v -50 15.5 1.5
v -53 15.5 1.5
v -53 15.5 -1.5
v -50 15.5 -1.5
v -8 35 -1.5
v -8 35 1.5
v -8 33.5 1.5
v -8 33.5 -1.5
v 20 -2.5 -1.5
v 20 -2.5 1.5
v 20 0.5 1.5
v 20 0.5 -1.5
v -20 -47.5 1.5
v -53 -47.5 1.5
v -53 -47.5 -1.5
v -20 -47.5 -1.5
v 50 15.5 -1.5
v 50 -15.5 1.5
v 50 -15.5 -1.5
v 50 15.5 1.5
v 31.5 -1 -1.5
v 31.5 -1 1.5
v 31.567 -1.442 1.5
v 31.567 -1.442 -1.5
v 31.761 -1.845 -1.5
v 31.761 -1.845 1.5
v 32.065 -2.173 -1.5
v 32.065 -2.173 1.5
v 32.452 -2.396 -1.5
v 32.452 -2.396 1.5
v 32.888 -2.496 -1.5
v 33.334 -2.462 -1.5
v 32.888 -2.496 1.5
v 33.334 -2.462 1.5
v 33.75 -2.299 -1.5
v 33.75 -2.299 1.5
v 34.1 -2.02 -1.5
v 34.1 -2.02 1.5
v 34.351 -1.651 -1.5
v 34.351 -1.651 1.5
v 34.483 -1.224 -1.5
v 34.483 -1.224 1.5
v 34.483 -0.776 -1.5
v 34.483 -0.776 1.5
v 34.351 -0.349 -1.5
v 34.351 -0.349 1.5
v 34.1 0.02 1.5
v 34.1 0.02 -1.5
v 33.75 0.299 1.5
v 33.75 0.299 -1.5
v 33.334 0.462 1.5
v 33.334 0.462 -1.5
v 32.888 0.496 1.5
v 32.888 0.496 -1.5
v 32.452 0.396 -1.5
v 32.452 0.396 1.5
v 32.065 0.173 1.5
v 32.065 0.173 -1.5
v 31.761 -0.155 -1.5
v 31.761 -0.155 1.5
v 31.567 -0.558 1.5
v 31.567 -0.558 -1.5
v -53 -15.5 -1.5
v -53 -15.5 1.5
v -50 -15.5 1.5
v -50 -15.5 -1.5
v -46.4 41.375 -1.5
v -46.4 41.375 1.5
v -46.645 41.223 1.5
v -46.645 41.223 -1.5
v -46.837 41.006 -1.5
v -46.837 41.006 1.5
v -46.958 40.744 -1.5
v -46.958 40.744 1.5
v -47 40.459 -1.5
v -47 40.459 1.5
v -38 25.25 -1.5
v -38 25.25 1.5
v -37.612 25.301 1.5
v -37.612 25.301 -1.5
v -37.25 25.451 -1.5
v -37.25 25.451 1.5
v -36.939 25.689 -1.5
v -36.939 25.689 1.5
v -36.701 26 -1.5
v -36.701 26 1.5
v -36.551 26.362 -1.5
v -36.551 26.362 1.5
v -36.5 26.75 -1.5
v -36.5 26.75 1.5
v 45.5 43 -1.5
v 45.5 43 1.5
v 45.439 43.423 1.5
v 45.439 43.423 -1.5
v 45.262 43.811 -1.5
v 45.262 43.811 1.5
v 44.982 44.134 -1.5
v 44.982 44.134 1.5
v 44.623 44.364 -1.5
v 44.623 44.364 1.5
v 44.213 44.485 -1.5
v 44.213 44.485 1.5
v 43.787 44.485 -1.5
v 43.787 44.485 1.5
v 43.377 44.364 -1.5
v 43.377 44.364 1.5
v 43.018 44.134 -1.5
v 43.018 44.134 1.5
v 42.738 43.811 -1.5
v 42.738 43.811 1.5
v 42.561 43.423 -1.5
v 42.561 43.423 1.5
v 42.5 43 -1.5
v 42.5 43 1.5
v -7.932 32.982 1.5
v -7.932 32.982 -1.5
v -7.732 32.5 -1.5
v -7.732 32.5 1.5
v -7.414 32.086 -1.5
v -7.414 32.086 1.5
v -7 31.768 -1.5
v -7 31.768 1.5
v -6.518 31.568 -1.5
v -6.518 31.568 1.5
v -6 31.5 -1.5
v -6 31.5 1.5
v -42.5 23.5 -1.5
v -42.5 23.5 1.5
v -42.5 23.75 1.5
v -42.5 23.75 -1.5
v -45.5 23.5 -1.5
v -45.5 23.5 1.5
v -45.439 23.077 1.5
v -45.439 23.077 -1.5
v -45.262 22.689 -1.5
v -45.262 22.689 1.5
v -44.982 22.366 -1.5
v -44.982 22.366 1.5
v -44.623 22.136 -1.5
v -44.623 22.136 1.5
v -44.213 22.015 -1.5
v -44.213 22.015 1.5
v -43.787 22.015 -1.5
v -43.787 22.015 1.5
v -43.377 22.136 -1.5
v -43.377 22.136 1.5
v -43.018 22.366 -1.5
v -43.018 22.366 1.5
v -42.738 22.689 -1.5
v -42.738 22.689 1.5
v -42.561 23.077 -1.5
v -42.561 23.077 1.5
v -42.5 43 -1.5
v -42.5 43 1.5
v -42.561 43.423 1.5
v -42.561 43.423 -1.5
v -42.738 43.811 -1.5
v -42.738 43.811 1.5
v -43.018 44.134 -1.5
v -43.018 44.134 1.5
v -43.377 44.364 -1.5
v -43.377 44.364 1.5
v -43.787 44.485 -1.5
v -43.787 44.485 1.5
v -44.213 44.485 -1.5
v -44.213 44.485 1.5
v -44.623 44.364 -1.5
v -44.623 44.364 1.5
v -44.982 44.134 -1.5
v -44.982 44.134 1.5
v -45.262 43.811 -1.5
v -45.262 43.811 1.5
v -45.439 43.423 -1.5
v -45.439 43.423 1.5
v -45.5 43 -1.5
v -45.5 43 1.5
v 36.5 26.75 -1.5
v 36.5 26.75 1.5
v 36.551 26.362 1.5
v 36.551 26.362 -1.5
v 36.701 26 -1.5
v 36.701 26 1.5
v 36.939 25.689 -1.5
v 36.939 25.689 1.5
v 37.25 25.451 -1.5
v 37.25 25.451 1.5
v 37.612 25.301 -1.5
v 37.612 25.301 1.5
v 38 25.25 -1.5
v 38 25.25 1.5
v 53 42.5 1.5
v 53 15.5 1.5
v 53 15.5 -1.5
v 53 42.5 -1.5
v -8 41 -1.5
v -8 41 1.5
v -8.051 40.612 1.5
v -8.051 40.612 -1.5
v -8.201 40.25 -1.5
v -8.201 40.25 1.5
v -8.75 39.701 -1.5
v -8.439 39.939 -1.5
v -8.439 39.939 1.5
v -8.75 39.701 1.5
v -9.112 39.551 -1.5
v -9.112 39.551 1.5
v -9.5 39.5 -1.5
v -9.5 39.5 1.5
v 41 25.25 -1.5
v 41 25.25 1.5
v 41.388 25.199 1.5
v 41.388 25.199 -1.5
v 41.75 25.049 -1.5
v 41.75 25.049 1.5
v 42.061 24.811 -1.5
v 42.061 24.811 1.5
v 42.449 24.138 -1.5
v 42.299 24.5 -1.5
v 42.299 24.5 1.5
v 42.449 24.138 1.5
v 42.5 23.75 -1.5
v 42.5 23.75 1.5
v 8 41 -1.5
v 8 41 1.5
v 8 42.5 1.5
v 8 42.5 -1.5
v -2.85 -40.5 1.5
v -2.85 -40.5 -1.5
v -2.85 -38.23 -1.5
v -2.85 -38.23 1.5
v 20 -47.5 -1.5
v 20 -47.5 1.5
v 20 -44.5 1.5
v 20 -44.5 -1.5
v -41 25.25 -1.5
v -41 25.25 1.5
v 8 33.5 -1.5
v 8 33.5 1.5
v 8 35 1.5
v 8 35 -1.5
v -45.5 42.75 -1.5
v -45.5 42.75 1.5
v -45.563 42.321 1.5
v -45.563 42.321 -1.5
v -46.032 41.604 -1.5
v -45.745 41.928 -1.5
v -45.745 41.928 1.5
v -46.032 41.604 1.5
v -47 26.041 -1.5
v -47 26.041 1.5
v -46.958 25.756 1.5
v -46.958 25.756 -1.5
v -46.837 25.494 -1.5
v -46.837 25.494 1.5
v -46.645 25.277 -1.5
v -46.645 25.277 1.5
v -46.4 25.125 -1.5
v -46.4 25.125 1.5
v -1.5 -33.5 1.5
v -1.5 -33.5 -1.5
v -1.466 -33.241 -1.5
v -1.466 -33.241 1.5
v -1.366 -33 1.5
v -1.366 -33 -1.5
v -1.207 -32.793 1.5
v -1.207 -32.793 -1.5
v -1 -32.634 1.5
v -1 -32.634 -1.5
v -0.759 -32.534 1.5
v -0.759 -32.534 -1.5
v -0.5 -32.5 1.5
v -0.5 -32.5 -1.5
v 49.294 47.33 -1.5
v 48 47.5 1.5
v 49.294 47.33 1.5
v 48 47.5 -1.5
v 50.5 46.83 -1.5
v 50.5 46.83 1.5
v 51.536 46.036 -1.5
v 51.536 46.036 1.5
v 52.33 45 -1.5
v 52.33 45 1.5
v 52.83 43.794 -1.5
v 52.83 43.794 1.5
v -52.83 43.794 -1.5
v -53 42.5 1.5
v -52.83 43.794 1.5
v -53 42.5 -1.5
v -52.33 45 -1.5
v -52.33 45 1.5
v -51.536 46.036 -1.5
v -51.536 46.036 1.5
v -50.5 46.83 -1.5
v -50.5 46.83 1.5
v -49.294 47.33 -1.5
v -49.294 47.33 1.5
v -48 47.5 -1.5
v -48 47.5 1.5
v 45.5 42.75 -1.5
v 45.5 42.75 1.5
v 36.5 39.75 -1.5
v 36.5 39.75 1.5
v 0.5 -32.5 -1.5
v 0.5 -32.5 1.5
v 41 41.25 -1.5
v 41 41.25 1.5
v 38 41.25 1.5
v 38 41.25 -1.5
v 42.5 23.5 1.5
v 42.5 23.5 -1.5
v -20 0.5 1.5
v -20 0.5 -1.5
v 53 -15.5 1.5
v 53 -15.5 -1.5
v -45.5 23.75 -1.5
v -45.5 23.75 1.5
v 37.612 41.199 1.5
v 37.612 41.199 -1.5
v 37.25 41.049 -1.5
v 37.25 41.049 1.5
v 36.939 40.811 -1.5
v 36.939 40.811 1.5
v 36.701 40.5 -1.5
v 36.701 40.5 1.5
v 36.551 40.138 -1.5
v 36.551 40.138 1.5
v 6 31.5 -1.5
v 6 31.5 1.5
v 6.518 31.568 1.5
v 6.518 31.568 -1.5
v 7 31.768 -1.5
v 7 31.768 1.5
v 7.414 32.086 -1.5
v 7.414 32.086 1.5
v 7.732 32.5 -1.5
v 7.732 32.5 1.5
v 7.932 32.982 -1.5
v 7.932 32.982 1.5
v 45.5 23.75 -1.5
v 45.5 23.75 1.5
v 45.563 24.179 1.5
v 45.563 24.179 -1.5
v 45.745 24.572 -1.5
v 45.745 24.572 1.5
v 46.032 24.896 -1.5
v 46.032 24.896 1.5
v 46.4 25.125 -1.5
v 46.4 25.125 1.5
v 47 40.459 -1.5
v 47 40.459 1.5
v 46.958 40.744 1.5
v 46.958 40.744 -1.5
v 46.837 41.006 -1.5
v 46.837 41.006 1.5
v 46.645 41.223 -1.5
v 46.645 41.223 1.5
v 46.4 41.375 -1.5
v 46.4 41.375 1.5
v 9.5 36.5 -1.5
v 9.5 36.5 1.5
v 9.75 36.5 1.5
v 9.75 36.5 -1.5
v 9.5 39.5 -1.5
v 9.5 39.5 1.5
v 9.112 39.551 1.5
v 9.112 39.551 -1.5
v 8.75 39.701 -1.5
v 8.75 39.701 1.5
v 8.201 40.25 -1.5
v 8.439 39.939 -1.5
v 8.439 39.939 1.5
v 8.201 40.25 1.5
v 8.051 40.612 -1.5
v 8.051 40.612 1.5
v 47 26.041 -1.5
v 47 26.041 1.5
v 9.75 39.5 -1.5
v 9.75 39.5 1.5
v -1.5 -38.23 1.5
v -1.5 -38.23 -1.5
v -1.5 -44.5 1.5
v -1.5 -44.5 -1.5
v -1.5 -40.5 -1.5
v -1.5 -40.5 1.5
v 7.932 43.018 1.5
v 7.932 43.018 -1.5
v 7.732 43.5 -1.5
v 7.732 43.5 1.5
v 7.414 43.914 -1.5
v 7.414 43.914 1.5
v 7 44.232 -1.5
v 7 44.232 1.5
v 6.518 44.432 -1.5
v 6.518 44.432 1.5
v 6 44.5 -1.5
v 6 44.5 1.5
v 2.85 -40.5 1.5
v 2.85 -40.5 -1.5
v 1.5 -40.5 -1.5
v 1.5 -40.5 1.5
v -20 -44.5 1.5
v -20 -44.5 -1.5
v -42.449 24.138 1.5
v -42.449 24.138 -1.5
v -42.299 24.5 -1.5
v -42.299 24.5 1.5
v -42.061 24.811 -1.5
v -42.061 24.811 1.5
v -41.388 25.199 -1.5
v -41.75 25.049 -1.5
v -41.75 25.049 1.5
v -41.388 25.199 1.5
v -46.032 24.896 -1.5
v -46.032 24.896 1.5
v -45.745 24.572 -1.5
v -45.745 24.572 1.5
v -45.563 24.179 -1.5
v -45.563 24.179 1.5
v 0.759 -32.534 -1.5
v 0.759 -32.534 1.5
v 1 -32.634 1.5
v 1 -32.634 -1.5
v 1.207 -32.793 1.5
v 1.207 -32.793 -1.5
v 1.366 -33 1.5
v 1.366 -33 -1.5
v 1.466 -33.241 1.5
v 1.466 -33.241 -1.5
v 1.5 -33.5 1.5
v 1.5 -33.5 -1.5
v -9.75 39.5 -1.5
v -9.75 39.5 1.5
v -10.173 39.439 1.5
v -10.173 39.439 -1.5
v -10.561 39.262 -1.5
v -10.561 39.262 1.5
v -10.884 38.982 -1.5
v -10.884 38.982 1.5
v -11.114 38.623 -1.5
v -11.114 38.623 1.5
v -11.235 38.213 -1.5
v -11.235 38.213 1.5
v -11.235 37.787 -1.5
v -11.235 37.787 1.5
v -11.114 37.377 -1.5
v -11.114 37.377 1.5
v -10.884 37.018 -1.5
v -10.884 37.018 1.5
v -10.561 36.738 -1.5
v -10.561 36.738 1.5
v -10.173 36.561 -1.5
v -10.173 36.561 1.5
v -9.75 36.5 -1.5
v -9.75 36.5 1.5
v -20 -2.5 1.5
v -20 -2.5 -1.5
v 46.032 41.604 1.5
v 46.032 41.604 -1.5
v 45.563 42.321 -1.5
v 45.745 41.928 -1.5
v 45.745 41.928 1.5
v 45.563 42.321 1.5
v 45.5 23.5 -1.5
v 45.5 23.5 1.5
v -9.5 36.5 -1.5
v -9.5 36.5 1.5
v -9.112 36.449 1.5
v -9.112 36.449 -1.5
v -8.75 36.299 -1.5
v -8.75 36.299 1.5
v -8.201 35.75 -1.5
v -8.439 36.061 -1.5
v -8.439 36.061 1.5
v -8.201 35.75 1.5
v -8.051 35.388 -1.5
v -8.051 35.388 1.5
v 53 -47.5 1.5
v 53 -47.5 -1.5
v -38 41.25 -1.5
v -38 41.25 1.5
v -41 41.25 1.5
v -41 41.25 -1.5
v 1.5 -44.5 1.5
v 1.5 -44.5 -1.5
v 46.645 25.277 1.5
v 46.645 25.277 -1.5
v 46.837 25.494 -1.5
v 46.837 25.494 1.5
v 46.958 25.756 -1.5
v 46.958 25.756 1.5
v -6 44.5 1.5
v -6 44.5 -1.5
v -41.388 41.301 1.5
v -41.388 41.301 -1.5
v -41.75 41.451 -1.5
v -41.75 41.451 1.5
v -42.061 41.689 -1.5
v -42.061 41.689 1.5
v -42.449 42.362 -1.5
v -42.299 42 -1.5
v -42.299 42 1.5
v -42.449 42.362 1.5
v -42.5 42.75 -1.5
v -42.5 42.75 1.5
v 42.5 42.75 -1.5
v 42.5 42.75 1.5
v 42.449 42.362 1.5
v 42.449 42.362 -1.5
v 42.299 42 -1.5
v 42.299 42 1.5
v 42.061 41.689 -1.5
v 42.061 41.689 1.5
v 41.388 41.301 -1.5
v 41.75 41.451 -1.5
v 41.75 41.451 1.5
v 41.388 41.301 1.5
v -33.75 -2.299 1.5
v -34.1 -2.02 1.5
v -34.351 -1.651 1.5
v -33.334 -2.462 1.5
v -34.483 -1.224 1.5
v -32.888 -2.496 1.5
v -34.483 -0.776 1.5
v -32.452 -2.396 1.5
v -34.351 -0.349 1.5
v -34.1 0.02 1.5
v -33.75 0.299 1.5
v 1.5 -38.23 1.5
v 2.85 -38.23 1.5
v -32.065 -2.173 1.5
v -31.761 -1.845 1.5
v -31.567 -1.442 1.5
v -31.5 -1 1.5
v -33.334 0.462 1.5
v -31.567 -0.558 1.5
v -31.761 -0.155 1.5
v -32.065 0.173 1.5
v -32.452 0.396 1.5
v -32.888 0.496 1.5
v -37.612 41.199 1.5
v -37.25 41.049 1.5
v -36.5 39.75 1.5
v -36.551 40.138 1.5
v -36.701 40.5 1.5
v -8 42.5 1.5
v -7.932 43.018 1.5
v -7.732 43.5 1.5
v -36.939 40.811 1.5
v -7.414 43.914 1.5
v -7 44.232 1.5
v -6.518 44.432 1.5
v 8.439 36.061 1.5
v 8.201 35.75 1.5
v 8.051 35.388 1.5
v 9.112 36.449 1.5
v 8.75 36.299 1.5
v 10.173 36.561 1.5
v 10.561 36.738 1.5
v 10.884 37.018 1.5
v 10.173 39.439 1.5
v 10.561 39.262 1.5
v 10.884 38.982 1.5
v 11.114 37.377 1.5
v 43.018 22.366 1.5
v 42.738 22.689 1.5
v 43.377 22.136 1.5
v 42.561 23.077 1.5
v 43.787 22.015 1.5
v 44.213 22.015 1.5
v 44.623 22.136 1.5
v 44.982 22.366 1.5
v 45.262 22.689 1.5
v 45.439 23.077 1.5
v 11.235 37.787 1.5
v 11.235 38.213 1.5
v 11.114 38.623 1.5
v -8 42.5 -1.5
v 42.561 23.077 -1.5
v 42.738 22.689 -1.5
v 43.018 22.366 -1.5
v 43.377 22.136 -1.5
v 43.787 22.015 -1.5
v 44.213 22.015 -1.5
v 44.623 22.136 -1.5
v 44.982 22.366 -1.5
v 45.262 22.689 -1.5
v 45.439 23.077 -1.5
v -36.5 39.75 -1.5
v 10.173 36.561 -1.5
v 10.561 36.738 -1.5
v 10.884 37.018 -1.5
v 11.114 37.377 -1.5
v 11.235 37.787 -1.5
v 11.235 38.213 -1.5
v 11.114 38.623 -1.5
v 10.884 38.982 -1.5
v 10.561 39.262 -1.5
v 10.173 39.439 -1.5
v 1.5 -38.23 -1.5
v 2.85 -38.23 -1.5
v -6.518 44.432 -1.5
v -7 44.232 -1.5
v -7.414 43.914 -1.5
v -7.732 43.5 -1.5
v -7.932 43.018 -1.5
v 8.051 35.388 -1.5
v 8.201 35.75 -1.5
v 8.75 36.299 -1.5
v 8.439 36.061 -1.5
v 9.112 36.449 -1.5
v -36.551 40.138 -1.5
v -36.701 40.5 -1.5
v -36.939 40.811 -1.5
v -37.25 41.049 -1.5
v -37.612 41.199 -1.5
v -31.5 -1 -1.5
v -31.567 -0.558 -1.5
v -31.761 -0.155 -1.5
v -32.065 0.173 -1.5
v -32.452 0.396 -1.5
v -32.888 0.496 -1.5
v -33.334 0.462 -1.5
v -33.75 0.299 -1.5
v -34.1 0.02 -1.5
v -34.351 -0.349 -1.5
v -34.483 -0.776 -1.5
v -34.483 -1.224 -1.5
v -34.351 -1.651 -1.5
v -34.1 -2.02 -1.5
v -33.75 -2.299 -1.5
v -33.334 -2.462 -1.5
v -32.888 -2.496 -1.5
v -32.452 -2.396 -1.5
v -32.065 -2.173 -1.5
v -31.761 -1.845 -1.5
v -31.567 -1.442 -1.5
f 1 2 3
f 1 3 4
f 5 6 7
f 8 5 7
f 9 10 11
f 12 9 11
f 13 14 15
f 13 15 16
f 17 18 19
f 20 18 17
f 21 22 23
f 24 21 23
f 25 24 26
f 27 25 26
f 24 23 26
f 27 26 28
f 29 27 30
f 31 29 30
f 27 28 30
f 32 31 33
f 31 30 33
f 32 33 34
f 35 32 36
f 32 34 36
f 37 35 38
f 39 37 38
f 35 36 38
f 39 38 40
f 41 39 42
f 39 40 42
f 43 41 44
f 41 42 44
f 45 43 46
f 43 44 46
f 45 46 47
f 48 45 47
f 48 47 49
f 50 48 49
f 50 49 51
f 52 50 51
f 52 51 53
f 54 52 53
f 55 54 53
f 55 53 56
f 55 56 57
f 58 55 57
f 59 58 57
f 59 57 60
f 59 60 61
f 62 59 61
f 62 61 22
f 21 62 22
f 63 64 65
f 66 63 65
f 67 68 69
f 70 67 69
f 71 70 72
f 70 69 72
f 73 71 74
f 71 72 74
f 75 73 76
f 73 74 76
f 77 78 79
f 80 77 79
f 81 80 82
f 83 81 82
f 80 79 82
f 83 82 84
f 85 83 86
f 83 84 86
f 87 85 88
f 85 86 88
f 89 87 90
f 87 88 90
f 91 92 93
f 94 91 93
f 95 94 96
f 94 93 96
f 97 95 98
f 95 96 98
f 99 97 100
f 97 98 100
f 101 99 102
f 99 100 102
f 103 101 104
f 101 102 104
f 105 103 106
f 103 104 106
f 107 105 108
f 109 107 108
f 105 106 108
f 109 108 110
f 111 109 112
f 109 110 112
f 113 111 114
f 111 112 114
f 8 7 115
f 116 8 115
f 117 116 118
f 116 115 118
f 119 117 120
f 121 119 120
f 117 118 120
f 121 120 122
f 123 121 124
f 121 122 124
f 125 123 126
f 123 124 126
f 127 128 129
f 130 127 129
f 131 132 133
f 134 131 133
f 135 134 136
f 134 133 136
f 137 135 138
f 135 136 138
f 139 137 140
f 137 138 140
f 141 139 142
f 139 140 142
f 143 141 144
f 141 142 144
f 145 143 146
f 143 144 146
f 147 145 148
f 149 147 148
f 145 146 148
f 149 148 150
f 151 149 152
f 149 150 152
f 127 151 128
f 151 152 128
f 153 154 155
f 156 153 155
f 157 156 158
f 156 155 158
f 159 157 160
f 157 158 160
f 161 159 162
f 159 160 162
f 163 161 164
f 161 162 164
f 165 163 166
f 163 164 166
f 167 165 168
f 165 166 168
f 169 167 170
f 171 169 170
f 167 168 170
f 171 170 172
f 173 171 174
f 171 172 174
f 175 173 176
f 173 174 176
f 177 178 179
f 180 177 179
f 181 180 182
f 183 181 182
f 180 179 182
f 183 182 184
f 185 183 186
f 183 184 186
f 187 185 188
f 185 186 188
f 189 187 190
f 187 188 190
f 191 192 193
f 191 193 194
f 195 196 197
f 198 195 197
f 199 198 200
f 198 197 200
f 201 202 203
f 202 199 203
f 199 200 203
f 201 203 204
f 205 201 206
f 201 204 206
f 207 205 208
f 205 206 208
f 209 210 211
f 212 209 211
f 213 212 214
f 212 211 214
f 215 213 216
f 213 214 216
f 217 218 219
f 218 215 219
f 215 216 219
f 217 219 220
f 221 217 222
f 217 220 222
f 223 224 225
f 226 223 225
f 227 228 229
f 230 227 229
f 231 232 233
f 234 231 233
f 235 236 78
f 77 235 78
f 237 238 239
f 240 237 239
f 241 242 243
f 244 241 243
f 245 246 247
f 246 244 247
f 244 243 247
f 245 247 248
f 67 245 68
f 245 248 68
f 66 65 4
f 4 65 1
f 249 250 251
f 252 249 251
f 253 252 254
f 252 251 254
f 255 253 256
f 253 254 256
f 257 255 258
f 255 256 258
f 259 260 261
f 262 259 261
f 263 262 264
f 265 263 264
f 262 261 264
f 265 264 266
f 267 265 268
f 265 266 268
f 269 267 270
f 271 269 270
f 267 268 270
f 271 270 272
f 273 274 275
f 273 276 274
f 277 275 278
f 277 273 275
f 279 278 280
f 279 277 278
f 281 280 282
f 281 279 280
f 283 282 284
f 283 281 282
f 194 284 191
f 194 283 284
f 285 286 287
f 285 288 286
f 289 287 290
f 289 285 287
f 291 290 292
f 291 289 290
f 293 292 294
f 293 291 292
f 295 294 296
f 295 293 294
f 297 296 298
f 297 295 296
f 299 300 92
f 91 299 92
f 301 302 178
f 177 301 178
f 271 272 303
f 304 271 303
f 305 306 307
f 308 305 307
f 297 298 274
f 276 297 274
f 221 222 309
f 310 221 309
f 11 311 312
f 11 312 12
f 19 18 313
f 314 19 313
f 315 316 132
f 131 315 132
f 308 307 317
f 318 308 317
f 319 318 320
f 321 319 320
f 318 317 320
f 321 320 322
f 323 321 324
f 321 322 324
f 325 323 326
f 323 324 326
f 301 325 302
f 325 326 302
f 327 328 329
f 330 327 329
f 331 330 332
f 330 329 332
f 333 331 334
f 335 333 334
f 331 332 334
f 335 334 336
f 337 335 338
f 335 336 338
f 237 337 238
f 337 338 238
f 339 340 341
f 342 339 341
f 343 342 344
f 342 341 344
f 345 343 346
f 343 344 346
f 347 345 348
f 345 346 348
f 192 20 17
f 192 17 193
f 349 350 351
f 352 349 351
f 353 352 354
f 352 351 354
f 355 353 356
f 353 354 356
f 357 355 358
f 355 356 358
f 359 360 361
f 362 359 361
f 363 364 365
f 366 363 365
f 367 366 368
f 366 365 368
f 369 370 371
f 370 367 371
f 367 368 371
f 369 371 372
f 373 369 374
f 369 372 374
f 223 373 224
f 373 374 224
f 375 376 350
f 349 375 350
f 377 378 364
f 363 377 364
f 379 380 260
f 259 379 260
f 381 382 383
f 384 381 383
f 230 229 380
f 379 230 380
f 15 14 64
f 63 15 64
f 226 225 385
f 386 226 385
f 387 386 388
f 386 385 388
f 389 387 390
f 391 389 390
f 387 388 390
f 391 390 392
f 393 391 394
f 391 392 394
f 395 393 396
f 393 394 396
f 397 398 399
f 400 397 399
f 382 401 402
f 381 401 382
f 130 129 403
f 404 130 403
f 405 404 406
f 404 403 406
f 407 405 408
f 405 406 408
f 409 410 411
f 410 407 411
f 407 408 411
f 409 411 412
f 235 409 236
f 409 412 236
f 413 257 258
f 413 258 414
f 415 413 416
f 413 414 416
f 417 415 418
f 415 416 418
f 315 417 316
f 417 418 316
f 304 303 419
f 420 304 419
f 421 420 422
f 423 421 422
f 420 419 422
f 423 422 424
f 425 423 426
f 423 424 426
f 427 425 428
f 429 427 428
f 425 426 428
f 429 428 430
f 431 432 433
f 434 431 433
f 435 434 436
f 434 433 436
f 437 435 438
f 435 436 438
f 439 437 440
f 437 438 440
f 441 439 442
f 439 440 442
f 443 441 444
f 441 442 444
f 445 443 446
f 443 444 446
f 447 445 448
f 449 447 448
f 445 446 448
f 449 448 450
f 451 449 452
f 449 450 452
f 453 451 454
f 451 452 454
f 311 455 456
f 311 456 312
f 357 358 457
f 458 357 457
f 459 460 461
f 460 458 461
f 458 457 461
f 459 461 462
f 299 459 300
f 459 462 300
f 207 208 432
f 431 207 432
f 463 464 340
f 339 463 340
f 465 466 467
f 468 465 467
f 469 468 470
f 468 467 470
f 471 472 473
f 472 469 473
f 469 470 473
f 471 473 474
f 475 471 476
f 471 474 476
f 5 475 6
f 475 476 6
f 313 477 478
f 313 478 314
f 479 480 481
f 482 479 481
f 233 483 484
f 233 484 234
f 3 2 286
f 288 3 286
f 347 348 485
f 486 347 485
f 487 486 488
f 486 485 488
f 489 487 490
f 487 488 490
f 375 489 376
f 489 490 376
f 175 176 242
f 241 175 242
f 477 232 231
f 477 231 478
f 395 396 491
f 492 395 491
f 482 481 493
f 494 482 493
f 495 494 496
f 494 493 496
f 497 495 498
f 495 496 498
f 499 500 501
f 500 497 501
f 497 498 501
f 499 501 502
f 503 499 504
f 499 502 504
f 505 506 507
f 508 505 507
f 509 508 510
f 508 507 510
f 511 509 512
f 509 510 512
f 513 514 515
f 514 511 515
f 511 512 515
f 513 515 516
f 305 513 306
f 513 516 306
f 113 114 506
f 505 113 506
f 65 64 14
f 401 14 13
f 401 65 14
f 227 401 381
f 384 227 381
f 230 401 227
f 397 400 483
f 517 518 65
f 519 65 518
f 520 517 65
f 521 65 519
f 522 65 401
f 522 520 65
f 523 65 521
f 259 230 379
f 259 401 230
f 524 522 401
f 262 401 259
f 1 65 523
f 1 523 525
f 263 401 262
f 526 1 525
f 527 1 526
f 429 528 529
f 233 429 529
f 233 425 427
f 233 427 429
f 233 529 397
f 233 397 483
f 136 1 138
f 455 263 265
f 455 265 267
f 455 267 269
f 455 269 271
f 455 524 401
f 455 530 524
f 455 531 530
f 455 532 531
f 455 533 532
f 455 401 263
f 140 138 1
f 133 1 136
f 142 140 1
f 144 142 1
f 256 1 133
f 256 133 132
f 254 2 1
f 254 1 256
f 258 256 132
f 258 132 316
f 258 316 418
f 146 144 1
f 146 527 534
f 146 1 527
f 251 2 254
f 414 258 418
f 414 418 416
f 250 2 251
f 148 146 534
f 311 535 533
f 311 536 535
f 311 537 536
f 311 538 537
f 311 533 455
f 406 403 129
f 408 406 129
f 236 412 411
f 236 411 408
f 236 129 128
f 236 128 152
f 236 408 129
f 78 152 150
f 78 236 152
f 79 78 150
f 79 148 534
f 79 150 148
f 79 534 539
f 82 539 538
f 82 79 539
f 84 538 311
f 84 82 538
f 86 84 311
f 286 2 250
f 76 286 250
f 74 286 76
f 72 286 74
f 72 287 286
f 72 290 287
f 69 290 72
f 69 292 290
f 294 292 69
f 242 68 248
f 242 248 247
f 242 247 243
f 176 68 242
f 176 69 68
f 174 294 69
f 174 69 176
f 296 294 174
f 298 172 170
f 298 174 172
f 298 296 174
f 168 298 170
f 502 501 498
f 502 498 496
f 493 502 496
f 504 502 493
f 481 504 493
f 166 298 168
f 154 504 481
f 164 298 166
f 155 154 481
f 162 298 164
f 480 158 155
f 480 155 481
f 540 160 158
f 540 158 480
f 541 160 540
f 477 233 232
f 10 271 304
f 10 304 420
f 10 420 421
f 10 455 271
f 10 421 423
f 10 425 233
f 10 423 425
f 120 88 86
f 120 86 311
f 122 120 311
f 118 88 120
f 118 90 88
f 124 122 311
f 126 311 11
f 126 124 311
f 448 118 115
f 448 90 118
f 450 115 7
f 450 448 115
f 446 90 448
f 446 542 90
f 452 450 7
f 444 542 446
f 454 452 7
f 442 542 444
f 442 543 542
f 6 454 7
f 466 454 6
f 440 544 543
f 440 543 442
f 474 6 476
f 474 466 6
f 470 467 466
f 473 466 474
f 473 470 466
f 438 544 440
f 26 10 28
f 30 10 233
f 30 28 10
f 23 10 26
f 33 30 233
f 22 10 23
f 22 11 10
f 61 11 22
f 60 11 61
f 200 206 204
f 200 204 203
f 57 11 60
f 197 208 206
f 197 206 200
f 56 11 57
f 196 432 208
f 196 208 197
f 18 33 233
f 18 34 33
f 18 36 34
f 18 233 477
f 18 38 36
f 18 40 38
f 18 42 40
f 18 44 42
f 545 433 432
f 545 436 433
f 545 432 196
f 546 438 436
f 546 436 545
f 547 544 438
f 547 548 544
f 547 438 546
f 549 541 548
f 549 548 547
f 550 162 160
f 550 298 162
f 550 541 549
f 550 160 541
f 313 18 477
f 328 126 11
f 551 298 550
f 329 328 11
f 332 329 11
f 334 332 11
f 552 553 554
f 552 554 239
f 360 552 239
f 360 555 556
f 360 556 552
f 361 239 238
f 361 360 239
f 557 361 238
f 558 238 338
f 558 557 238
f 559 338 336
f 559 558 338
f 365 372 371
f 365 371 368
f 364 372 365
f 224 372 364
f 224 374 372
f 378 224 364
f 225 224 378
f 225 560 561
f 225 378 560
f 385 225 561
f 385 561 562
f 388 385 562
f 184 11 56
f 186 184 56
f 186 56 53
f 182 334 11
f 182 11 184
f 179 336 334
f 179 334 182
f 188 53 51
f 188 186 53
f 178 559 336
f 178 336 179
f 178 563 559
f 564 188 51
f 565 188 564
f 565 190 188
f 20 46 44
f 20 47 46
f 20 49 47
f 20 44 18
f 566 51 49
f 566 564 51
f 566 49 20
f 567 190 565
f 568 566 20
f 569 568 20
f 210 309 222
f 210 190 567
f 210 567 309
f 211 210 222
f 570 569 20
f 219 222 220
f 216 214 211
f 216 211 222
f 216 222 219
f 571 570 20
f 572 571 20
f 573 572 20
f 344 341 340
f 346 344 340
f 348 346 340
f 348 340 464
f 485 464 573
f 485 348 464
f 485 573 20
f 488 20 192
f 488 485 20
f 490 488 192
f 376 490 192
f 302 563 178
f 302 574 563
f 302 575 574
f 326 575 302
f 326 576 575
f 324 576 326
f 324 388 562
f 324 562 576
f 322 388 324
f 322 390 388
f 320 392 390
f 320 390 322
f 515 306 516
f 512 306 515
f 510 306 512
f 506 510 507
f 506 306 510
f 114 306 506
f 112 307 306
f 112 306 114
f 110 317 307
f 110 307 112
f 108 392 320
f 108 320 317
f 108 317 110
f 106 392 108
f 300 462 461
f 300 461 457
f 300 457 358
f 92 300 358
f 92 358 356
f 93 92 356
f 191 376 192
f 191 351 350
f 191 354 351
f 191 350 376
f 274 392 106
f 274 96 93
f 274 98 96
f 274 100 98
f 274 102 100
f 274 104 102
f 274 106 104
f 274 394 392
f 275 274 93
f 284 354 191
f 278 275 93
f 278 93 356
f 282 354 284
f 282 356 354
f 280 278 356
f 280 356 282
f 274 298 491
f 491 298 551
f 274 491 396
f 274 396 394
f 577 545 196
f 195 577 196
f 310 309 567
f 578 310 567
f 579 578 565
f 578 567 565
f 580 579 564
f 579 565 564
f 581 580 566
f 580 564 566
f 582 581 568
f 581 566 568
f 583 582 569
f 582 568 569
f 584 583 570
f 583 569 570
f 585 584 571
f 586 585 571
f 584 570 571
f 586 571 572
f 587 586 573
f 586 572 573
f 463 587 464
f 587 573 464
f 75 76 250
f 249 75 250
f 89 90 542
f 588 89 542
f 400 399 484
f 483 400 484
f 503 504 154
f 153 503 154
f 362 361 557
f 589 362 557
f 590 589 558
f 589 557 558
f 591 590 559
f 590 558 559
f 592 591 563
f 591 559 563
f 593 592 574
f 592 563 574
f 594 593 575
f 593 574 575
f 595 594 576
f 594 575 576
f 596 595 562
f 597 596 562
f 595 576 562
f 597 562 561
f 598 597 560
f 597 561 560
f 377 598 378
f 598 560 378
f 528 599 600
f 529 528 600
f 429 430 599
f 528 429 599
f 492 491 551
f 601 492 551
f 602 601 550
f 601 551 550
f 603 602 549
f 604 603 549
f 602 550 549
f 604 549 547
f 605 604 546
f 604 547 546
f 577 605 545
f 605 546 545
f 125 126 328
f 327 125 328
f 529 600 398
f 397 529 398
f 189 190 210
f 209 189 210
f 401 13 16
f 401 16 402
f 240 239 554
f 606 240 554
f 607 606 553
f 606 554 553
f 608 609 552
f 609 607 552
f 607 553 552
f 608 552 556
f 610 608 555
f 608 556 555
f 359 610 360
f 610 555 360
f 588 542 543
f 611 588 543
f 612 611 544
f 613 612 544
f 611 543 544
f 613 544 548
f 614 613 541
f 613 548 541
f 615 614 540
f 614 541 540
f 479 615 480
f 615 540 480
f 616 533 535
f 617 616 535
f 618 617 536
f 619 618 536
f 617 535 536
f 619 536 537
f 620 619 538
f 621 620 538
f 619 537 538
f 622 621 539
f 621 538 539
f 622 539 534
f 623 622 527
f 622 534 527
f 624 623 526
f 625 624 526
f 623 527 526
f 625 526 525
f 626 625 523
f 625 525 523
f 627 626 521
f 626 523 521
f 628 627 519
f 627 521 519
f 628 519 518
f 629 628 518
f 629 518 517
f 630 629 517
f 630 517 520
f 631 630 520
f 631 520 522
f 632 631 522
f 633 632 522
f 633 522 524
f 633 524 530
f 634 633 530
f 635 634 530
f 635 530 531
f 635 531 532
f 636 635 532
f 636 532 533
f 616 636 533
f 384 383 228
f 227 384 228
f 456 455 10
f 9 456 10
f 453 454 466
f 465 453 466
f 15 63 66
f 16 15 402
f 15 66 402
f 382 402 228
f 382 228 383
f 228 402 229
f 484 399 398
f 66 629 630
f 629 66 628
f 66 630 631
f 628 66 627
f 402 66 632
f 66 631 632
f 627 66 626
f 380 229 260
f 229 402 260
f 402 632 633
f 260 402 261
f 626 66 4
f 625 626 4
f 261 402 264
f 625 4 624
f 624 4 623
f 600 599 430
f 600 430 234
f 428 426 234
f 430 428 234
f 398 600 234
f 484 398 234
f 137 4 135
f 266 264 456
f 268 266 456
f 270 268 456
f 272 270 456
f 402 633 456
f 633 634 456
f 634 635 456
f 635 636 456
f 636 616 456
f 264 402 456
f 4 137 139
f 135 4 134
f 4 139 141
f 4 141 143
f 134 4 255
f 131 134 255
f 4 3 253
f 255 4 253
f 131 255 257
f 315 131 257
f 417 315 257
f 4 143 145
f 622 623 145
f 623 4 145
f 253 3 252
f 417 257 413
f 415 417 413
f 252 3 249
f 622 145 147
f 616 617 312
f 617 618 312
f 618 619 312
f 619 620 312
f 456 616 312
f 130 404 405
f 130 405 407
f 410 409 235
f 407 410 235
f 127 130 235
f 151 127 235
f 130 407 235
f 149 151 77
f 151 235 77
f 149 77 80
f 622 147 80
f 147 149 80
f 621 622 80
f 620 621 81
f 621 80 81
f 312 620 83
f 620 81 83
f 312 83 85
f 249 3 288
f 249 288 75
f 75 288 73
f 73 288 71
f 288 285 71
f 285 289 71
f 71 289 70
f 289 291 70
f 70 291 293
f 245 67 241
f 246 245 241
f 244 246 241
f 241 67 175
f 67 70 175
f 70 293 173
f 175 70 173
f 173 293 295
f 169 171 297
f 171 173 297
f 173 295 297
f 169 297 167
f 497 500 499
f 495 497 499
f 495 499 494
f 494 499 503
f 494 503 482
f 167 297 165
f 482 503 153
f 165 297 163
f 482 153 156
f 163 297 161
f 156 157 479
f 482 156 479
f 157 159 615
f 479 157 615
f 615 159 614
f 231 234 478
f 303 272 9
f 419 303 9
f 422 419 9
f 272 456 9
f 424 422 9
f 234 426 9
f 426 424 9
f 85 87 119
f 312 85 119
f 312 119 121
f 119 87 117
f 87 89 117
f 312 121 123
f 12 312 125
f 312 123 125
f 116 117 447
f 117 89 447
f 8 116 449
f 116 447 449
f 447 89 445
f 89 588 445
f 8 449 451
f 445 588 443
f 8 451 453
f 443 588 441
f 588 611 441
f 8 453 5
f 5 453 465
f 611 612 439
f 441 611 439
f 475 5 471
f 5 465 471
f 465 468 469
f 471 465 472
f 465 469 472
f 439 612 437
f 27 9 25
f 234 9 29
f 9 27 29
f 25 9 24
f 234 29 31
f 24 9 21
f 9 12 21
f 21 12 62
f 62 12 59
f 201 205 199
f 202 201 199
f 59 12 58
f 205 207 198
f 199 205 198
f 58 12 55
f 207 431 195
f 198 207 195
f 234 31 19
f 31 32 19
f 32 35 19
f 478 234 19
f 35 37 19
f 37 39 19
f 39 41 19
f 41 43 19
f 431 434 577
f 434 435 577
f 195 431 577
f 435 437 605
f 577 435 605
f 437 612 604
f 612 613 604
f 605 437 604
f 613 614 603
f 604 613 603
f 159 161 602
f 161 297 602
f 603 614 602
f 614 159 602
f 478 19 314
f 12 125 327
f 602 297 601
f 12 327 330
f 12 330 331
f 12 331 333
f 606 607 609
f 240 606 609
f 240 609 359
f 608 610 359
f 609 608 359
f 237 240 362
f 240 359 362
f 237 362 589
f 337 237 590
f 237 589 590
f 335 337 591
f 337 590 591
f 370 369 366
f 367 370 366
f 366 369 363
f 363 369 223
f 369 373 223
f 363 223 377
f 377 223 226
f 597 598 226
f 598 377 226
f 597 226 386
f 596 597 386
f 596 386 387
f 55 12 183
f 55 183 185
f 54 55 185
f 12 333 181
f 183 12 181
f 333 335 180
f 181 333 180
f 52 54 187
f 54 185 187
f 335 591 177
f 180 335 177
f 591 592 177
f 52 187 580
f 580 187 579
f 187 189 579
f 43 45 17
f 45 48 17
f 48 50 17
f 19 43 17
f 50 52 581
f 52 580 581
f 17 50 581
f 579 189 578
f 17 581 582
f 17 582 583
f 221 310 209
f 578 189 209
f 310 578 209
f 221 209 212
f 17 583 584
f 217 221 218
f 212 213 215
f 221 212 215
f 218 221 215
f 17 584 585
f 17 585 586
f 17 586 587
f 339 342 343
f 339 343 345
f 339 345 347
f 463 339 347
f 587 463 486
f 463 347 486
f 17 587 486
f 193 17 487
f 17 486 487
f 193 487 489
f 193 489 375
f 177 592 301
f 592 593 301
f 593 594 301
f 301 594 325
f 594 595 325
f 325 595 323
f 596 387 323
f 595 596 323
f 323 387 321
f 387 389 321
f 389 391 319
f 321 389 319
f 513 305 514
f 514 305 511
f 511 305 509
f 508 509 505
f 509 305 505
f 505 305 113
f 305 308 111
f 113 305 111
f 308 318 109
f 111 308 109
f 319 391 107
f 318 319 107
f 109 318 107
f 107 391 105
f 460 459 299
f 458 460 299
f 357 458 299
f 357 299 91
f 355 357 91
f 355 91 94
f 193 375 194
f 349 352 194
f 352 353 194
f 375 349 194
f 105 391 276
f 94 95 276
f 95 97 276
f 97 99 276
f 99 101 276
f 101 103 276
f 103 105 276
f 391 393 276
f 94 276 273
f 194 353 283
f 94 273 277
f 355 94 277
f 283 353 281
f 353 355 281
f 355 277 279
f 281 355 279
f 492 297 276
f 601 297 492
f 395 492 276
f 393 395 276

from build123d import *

# Parameters (mm, degrees)
ESBO_O1_W                = 100
ESBO_O1_H                = 95
RESSALTO_EXTRUS_O1_DEPTH = 1.5
ESBO_O2_R                = 1.5
ESBO_O2_W                = 40
ESBO_O2_H                = 3
CORTE_EXTRUS_O1_DEPTH    = 70.030790232
ESBO_O3_W                = 3
ESBO_O3_H                = 32
RESSALTO_EXTRUS_O2_DEPTH = 3
CUT_EXTRUDE1_DEPTH       = 72.233770081
CUT_EXTRUDE1_DEPTH_BACK  = 72.233770081
CUT_EXTRUDE4_DEPTH       = 72.186375101
CUT_EXTRUDE4_DEPTH_BACK  = 72.186375101
FILLET1_R                = 5


with BuildPart() as part:
    # Esboço1 → Ressalto-extrusão1 (new, symmetric)
    with BuildSketch(Plane.XY):
        Rectangle(ESBO_O1_W, ESBO_O1_H)
    extrude(amount=RESSALTO_EXTRUS_O1_DEPTH, both=True)

    # Esboço2 → Corte-extrusão1 (cut, through all)
    with BuildSketch(Plane.XY.offset(1.5)):
        with Locations((-33, -1)):
            Circle(ESBO_O2_R)
        with Locations(Location((33, -1, 0), (0, 0, 180))):
            Circle(ESBO_O2_R)
        with Locations((0, -46)):
            Rectangle(ESBO_O2_W, ESBO_O2_H)
        with Locations((0, -1)):
            Rectangle(ESBO_O2_W, ESBO_O2_H)
    extrude(amount=-CORTE_EXTRUS_O1_DEPTH, mode=Mode.SUBTRACT)

    # Esboço3 → Ressalto-extrusão2 (add, through all)
    with BuildSketch(Plane.XY.offset(1.5)):
        with Locations((-51.5, -31.5)):
            Rectangle(ESBO_O3_W, ESBO_O3_H)
        with Locations((51.5, -31.5)):
            Rectangle(ESBO_O3_W, ESBO_O3_H)
        with Locations((-51.5, 31.5)):
            Rectangle(ESBO_O3_W, ESBO_O3_H)
        with Locations((51.5, 31.5)):
            Rectangle(ESBO_O3_W, ESBO_O3_H)
    extrude(amount=-RESSALTO_EXTRUS_O2_DEPTH)

    # Sketch1 → Cut-Extrude1 (cut, two sides: drawn at the far end of the back side and taken through both)
    with BuildSketch(Plane(origin=(0, 0, -1.5), x_dir=(-1, 0, 0), z_dir=(0, 0, -1)).offset(-CUT_EXTRUDE1_DEPTH_BACK)):
        with BuildLine():
            Line((-36.5, 39.75), (-36.5, 26.75))
            ThreePointArc((-36.5, 26.75), (-36.939339828, 25.689339828), (-38, 25.25))
            Line((-38, 25.25), (-41, 25.25))
            ThreePointArc((-41, 25.25), (-42.060660172, 24.810660172), (-42.5, 23.75))
            Line((-42.5, 23.75), (-42.5, 23.5))
            ThreePointArc((-42.5, 23.5), (-44, 22), (-45.5, 23.5))
            Line((-45.5, 23.5), (-45.5, 23.75))
            ThreePointArc((-45.5, 23.75), (-45.74500996, 24.571583836), (-46.4, 25.124772708))
            ThreePointArc((-46.4, 25.124772708), (-46.836660027, 25.49356529), (-47, 26.041287847))
            Line((-47, 26.041287847), (-47, 40.458712153))
            ThreePointArc((-47, 40.458712153), (-46.836660027, 41.00643471), (-46.4, 41.375227292))
            ThreePointArc((-46.4, 41.375227292), (-45.74500996, 41.928416164), (-45.5, 42.75))
            Line((-45.5, 42.75), (-45.5, 43))
            ThreePointArc((-45.5, 43), (-44, 44.5), (-42.5, 43))
            Line((-42.5, 43), (-42.5, 42.75))
            ThreePointArc((-42.5, 42.75), (-42.060660172, 41.689339828), (-41, 41.25))
            Line((-41, 41.25), (-38, 41.25))
            ThreePointArc((-38, 41.25), (-36.939339828, 40.810660172), (-36.5, 39.75))
        make_face()
        with BuildLine():
            Line((-6, 44.5), (6, 44.5))
            ThreePointArc((6, 44.5), (7.414213562, 43.914213562), (8, 42.5))
            Line((8, 42.5), (8, 41))
            ThreePointArc((8, 41), (8.439339828, 39.939339828), (9.5, 39.5))
            Line((9.5, 39.5), (9.75, 39.5))
            ThreePointArc((9.75, 39.5), (11.25, 38), (9.75, 36.5))
            Line((9.75, 36.5), (9.5, 36.5))
            ThreePointArc((9.5, 36.5), (8.439339828, 36.060660172), (8, 35))
            Line((8, 35), (8, 33.5))
            ThreePointArc((8, 33.5), (7.414213562, 32.085786438), (6, 31.5))
            Line((6, 31.5), (-6, 31.5))
            ThreePointArc((-6, 31.5), (-7.414213562, 32.085786438), (-8, 33.5))
            Line((-8, 33.5), (-8, 35))
            ThreePointArc((-8, 35), (-8.439339828, 36.060660172), (-9.5, 36.5))
            Line((-9.5, 36.5), (-9.75, 36.5))
            ThreePointArc((-9.75, 36.5), (-11.25, 38), (-9.75, 39.5))
            Line((-9.75, 39.5), (-9.5, 39.5))
            ThreePointArc((-9.5, 39.5), (-8.439339828, 39.939339828), (-8, 41))
            Line((-8, 41), (-8, 42.5))
            ThreePointArc((-8, 42.5), (-7.414213562, 43.914213562), (-6, 44.5))
        make_face()
        with BuildLine():
            Line((47, 40.458712153), (47, 26.041287847))
            ThreePointArc((47, 26.041287847), (46.836660027, 25.49356529), (46.4, 25.124772708))
            ThreePointArc((46.4, 25.124772708), (45.74500996, 24.571583836), (45.5, 23.75))
            Line((45.5, 23.75), (45.5, 23.5))
            ThreePointArc((45.5, 23.5), (44, 22), (42.5, 23.5))
            Line((42.5, 23.5), (42.5, 23.75))
            ThreePointArc((42.5, 23.75), (42.060660172, 24.810660172), (41, 25.25))
            Line((41, 25.25), (38, 25.25))
            ThreePointArc((38, 25.25), (36.939339828, 25.689339828), (36.5, 26.75))
            Line((36.5, 26.75), (36.5, 39.75))
            ThreePointArc((36.5, 39.75), (36.939339828, 40.810660172), (38, 41.25))
            Line((38, 41.25), (41, 41.25))
            ThreePointArc((41, 41.25), (42.060660172, 41.689339828), (42.5, 42.75))
            Line((42.5, 42.75), (42.5, 43))
            ThreePointArc((42.5, 43), (44, 44.5), (45.5, 43))
            Line((45.5, 43), (45.5, 42.75))
            ThreePointArc((45.5, 42.75), (45.74500996, 41.928416164), (46.4, 41.375227292))
            ThreePointArc((46.4, 41.375227292), (46.836660027, 41.00643471), (47, 40.458712153))
        make_face()
    extrude(amount=CUT_EXTRUDE1_DEPTH + CUT_EXTRUDE1_DEPTH_BACK, mode=Mode.SUBTRACT)

    # Sketch2 → Cut-Extrude4 (cut, two sides: drawn at the far end of the back side and taken through both)
    with BuildSketch(Plane.XY.offset(-CUT_EXTRUDE4_DEPTH_BACK)):
        with BuildLine():
            Line((-0.5, -32.5), (0.5, -32.5))
            ThreePointArc((0.5, -32.5), (1.207106781, -32.792893219), (1.5, -33.5))
            Line((1.5, -33.5), (1.5, -38.23))
            Line((1.5, -38.23), (2.85, -38.23))
            Line((2.85, -38.23), (2.85, -40.5))
            Line((2.85, -40.5), (1.5, -40.5))
            Line((1.5, -40.5), (1.5, -44.5))
            Line((1.5, -44.5), (-1.5, -44.5))
            Line((-1.5, -44.5), (-1.5, -40.5))
            Line((-1.5, -40.5), (-2.85, -40.5))
            Line((-2.85, -40.5), (-2.85, -38.23))
            Line((-2.85, -38.23), (-1.5, -38.23))
            Line((-1.5, -38.23), (-1.5, -33.5))
            ThreePointArc((-1.5, -33.5), (-1.207106781, -32.792893219), (-0.5, -32.5))
        make_face()
    extrude(amount=CUT_EXTRUDE4_DEPTH + CUT_EXTRUDE4_DEPTH_BACK, mode=Mode.SUBTRACT)

    # Fillet1
    fillet1_edges = [part.edges().sort_by_distance(p)[0] for p in [
        (53, 47.5, 0),
        (-53, 47.5, 0),
    ]]
    fillet(fillet1_edges, radius=FILLET1_R)


solid = part.part
